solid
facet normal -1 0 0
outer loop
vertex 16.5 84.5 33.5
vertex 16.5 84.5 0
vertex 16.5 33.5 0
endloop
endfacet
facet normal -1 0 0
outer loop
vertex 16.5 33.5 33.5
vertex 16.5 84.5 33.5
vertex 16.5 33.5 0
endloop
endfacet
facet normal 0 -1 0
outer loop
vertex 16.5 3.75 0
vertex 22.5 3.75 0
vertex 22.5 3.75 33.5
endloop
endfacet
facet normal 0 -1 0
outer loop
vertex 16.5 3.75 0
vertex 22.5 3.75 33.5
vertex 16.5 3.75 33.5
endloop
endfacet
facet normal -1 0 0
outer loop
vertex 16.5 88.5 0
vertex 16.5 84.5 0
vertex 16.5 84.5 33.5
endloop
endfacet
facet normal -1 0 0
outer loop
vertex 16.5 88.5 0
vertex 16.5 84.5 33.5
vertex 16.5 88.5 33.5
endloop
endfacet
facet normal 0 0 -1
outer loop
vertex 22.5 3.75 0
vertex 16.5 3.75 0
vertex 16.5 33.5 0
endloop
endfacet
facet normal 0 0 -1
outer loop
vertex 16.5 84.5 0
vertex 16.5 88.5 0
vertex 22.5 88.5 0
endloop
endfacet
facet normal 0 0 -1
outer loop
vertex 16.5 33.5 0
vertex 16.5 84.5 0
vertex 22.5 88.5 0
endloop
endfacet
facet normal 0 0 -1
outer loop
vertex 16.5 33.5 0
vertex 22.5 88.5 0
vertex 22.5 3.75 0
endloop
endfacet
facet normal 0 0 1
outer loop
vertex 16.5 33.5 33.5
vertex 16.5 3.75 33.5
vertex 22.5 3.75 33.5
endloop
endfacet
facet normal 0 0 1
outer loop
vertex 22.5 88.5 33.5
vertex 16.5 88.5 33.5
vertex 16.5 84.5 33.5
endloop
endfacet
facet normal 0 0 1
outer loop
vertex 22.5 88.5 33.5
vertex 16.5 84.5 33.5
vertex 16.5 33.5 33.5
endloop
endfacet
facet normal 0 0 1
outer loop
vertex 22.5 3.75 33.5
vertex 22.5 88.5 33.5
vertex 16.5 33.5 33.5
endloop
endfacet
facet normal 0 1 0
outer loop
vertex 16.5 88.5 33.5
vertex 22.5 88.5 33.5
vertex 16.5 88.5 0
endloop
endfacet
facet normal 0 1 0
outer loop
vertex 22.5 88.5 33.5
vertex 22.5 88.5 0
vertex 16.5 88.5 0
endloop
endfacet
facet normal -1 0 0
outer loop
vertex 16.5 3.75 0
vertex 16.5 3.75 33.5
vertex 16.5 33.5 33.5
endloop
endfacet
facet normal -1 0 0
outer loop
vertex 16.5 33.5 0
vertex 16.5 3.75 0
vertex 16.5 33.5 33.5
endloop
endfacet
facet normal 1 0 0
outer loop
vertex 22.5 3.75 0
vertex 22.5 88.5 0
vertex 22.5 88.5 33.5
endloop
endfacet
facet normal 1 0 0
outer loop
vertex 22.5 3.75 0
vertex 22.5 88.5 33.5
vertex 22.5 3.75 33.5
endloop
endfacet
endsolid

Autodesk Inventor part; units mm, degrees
ref_plane "YZ Plane" through (0, 0, 0) normal (1, 0, 0) x (0, 1, 0)
ref_plane "XZ Plane" through (0, 0, 0) normal (0, 1, 0) x (-1, 0, 0)
ref_plane "Work Plane1" through (0, 0, 0) normal (0, 0, 1) x (1, 0, 0)
sketch "Sketch1" plane through (0, 0, 0) normal (0, 0, 1) x (1, 0, 0)
  line L0 (23.5, 88.5) -> (-23.5, 88.5) projected
  line L1 (-23.5, 88.5) -> (-23.5, 33.5) projected
  line L2 (-23.5, 33.5) -> (-89, 33.5) projected
  line L3 (-89, 33.5) -> (-89, -73.5) projected
  line L4 (-89, -73.5) -> (-74, -73.5) projected
  line L5 (-74, -73.5) -> (-74, -93.5) projected
  line L6 (-74, -93.5) -> (74, -93.5) projected
  line L7 (74, -93.5) -> (74, -73.5) projected
  line L8 (74, -73.5) -> (89, -73.5) projected
  line L9 (89, -73.5) -> (89, 33.5) projected
  line L10 (89, 33.5) -> (23.5, 33.5) projected
  line L11 (23.5, 33.5) -> (23.5, 88.5) projected
  line L12 (-4.5, 84.5) -> (-4.5, 33.5) projected
  line L13 (-4.5, 33.5) -> (-16.5, 33.5) projected
  line L14 (-16.5, 33.5) -> (-16.5, 84.5) projected
  line L15 (4.5, 84.5) -> (16.5, 84.5) projected
  line L16 (16.5, 84.5) -> (16.5, 33.5) projected
  line L17 (16.5, 33.5) -> (4.5, 33.5) projected
  line L18 (4.5, 33.5) -> (4.5, 84.5) projected
  line L19 (-16.5, 84.5) -> (-4.5, 84.5) projected
  line L20 (16.5, 88.5) -> (22.5, 88.5)
  line L21 (22.5, 88.5) -> (22.5, 3.75)
  line L22 (22.5, 3.75) -> (16.5, 3.75)
  line L23 (16.5, 3.75) -> (16.5, 88.5)
  line L24 (59.9, 4.75) -> (32.2, 4.75)
  point P0 (0, 0)
  dimension "d0" = 1
  dimension "d1" = 1
ref_plane "Work Plane2" through (-89, -40.3889, 33.5) normal (0, 0, 1) x (1, 0, 0)
extrude "Extrusion1" add sketch "Sketch1" along normal up to surface (33.5 mm away) contours L21 L22 L23 L16 L0
properties part number "left_gear_holder"
